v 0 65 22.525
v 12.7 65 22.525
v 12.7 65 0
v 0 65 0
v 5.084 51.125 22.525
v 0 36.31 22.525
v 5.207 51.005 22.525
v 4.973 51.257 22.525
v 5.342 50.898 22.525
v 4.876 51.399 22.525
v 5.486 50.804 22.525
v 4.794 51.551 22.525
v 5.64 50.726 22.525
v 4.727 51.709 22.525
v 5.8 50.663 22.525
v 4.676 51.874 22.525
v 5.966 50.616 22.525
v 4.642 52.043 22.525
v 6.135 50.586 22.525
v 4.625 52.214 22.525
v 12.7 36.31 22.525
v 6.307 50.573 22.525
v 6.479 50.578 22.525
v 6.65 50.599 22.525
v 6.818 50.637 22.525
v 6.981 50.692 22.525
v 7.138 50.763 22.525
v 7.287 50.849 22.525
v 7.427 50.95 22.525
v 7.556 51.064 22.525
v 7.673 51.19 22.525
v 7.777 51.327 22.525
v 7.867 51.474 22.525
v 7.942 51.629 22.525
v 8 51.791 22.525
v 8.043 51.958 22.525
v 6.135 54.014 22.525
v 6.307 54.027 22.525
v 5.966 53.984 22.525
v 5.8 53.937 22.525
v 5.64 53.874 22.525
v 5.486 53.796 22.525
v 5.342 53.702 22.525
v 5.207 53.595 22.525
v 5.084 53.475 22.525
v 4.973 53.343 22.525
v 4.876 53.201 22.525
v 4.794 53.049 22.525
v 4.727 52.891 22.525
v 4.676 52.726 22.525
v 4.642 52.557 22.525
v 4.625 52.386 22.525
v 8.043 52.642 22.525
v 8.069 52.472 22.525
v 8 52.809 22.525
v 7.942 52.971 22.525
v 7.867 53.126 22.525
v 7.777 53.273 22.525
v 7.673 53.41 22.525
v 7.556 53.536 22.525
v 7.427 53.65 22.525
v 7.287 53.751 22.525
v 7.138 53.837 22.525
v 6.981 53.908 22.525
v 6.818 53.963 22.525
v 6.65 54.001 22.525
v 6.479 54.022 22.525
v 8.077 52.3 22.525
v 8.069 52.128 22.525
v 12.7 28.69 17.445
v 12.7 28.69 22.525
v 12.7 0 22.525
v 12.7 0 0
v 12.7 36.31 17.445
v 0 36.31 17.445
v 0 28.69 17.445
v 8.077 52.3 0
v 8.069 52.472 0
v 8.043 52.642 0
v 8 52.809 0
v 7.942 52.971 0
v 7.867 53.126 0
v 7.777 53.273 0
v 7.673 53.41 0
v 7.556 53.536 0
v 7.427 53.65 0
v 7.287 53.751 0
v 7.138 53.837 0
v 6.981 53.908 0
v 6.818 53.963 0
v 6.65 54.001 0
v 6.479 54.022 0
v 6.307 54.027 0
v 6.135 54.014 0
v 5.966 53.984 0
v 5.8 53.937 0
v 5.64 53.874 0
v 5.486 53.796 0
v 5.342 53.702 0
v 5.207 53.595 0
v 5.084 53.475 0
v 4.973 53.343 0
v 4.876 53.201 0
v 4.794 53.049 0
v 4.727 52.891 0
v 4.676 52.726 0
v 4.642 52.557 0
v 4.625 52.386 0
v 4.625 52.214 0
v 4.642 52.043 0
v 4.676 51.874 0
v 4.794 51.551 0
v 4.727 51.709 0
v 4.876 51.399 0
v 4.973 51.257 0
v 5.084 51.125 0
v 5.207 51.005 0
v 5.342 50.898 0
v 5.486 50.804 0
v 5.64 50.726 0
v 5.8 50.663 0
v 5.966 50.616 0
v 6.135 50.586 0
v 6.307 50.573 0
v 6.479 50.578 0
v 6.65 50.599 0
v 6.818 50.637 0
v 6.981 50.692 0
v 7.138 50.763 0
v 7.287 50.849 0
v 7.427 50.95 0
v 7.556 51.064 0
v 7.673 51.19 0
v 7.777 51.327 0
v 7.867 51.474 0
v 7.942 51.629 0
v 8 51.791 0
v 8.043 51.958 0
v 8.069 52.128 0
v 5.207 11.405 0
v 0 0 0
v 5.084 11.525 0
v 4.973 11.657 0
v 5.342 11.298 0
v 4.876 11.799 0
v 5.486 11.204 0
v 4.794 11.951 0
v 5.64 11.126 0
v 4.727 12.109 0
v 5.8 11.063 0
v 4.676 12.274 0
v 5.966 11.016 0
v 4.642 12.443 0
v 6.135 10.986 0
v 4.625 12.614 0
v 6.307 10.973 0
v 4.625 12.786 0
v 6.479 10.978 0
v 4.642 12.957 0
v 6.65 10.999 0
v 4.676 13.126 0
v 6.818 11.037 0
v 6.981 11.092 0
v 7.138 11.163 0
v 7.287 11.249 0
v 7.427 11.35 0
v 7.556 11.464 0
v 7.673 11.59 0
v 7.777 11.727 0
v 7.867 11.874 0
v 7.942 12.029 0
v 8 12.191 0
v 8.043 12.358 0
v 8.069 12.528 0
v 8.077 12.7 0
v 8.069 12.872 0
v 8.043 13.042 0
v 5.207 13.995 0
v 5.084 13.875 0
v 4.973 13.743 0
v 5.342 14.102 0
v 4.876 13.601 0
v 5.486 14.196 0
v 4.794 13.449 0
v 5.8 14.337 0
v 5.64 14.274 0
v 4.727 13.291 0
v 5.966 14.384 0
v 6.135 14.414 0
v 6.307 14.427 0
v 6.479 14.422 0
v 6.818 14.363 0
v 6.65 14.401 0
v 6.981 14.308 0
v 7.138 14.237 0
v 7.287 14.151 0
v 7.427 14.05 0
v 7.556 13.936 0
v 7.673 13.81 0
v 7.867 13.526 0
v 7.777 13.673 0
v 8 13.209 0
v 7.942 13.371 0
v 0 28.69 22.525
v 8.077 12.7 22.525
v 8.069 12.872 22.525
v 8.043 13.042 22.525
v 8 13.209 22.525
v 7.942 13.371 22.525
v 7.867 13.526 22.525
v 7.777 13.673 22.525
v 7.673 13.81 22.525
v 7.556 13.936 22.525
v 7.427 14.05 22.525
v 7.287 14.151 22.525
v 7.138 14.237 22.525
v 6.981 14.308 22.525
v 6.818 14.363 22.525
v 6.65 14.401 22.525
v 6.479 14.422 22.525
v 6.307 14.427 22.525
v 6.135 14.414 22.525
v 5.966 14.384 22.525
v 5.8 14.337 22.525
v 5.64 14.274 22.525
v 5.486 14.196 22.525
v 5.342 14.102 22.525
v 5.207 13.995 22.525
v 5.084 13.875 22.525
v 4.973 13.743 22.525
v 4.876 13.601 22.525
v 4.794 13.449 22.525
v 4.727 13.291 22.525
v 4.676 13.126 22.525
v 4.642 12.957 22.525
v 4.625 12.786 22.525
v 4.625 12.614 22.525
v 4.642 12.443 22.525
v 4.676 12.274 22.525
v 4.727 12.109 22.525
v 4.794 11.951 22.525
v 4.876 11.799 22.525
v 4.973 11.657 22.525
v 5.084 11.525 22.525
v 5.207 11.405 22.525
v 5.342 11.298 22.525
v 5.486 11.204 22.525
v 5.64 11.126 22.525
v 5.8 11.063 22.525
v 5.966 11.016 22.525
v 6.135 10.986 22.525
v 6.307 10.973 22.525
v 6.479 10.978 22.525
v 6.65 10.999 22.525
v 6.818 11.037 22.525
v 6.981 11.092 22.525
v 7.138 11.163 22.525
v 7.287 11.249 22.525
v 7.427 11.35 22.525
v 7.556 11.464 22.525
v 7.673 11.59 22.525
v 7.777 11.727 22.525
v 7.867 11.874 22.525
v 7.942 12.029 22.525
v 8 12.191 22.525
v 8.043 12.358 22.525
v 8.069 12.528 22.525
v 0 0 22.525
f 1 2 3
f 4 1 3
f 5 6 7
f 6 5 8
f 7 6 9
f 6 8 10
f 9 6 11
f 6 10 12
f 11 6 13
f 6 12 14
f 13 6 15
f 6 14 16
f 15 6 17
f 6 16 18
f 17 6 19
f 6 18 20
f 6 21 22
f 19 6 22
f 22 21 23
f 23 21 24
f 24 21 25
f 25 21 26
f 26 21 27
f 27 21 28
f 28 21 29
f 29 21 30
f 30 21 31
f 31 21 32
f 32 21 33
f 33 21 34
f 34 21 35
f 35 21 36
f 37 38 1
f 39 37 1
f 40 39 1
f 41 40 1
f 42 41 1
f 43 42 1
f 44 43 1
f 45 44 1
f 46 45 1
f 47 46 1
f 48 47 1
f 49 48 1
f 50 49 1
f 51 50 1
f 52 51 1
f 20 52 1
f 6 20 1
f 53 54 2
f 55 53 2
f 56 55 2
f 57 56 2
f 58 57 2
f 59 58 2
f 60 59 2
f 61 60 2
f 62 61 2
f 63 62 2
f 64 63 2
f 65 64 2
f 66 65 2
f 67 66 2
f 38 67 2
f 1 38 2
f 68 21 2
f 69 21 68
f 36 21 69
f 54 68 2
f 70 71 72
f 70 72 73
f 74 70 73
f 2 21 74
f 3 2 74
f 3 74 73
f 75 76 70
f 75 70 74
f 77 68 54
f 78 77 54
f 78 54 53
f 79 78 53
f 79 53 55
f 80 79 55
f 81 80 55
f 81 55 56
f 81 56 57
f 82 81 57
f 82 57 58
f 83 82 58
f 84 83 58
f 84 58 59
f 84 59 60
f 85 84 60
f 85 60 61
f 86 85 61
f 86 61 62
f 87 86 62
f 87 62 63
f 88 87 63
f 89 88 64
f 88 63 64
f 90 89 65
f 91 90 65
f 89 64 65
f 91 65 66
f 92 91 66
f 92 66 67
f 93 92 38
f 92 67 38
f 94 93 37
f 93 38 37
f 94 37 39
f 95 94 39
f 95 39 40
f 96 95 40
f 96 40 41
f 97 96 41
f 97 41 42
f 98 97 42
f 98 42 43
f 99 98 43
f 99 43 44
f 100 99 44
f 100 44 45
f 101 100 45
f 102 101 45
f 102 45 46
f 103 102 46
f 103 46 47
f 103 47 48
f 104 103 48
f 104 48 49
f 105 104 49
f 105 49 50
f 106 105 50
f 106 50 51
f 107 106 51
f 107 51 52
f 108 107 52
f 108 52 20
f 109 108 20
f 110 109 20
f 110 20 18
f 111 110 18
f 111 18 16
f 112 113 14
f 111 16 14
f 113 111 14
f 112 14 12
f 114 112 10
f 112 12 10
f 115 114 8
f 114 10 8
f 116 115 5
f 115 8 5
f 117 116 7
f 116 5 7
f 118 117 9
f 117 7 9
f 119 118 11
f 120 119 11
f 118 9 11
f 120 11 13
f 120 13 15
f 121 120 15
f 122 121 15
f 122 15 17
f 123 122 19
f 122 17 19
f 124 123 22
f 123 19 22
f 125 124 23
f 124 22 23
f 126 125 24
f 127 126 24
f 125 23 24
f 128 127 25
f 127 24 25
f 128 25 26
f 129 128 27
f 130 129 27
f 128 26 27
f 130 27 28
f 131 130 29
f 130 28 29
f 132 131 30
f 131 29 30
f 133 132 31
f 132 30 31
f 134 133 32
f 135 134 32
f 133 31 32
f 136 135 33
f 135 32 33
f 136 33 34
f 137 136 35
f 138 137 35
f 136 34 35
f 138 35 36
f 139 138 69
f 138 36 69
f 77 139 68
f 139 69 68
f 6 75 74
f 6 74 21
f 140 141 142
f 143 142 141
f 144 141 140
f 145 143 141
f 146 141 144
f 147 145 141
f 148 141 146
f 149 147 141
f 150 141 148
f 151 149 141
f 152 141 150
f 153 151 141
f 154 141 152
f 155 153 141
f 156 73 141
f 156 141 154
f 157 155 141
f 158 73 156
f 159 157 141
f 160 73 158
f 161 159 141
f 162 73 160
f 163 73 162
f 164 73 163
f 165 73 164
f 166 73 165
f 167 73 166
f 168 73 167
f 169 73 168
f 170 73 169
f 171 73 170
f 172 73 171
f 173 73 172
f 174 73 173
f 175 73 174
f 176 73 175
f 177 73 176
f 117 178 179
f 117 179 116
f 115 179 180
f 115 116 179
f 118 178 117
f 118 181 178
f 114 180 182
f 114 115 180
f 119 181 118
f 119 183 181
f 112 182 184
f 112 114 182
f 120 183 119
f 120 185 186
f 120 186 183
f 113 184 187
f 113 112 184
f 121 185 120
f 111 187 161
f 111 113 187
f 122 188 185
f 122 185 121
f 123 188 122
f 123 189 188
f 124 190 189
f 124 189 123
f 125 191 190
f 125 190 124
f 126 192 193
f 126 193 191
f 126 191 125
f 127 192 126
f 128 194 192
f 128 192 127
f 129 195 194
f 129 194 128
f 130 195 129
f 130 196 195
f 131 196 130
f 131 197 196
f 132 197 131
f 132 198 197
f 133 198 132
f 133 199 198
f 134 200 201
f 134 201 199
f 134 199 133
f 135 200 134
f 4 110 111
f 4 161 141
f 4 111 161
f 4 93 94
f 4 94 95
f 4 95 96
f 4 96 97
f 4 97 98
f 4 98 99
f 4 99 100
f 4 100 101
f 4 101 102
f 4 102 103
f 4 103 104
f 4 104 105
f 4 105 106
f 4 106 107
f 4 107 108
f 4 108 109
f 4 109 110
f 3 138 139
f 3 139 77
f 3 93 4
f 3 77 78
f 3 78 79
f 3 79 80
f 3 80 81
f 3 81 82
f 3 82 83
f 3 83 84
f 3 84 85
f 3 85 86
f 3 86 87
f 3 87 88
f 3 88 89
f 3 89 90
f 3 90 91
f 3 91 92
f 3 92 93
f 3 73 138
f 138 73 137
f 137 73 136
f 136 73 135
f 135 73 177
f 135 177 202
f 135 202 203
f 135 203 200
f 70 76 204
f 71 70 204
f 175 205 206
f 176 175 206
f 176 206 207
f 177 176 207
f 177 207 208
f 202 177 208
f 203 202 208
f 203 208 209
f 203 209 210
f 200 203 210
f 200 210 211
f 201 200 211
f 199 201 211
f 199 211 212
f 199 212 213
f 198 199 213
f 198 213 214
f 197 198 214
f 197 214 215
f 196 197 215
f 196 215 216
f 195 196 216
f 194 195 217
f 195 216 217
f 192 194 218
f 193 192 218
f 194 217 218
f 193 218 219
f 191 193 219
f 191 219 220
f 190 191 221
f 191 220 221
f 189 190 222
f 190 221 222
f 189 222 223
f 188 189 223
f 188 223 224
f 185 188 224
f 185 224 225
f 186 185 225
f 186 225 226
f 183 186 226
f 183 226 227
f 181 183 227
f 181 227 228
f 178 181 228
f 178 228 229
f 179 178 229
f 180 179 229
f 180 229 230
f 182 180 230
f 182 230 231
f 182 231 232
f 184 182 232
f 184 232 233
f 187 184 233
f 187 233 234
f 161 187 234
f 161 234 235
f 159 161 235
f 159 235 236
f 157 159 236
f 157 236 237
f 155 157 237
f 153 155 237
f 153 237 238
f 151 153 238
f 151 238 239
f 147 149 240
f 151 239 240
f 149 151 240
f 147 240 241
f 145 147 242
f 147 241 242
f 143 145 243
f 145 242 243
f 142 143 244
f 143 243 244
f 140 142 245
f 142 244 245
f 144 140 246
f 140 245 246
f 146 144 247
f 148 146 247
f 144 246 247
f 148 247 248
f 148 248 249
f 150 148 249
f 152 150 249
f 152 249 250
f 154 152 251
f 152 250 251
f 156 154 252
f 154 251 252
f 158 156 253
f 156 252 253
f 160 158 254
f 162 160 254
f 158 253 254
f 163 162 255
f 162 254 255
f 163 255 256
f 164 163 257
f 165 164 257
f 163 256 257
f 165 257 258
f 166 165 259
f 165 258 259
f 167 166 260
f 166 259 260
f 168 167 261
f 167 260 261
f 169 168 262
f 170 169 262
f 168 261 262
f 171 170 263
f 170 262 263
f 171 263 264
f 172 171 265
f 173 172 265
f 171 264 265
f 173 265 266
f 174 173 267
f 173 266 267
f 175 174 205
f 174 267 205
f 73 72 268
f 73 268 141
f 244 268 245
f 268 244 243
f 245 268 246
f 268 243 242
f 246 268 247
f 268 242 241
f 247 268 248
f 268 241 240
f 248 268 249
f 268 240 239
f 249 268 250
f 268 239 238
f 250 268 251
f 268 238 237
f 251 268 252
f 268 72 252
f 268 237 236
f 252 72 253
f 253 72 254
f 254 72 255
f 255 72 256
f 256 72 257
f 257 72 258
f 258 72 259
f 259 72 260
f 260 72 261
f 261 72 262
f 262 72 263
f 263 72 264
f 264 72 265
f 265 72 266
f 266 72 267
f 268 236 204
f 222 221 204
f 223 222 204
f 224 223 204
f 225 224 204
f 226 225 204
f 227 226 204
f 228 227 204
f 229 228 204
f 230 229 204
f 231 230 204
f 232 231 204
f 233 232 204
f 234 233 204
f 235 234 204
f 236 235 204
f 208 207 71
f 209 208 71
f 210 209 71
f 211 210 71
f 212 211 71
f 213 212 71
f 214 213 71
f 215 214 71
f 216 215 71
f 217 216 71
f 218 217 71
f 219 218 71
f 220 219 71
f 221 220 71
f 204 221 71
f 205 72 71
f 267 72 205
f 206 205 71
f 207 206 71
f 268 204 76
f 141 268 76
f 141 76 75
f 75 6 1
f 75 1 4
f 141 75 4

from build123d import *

# Parameters (mm, degrees)
ESBO_O1_W                   = 22.5248
ESBO_O1_H                   = 65
RESSALTO_EXTRUS_O1_DEPTH    = 12.7
ESBO_O2_W                   = 5.08
ESBO_O2_H                   = 7.62
CORTE_EXTRUS_O1_DEPTH       = 13.7
FURO_COM_FOLGA_DE_M31_D     = 3.4544
FURO_COM_FOLGA_DE_M31_DEPTH = 22.5248


with BuildPart() as part:
    # Esboço1 → Ressalto-extrusão1 (new body)
    with BuildSketch(Plane(origin=(12.7, 0, 0), x_dir=(0, 0, -1), z_dir=(1, 0, 0))):
        with Locations((-11.2624, 32.5)):
            Rectangle(ESBO_O1_W, ESBO_O1_H)
    extrude(amount=-RESSALTO_EXTRUS_O1_DEPTH)

    # Esboço2 → Corte-extrusão1 (cut, through all)
    with BuildSketch(Plane.ZY):
        with Locations((19.9848, 32.5)):
            Rectangle(ESBO_O2_W, ESBO_O2_H)
    extrude(amount=-CORTE_EXTRUS_O1_DEPTH, mode=Mode.SUBTRACT)

    # Furo com folga de M31
    with Locations(Plane(origin=(0, 0, 0), x_dir=(-1, 0, 0), z_dir=(0, 0, -1))):
        with Locations((-6.35, 12.7), (-6.35, 52.3)):
            Hole(FURO_COM_FOLGA_DE_M31_D / 2, depth=FURO_COM_FOLGA_DE_M31_DEPTH)


solid = part.part
